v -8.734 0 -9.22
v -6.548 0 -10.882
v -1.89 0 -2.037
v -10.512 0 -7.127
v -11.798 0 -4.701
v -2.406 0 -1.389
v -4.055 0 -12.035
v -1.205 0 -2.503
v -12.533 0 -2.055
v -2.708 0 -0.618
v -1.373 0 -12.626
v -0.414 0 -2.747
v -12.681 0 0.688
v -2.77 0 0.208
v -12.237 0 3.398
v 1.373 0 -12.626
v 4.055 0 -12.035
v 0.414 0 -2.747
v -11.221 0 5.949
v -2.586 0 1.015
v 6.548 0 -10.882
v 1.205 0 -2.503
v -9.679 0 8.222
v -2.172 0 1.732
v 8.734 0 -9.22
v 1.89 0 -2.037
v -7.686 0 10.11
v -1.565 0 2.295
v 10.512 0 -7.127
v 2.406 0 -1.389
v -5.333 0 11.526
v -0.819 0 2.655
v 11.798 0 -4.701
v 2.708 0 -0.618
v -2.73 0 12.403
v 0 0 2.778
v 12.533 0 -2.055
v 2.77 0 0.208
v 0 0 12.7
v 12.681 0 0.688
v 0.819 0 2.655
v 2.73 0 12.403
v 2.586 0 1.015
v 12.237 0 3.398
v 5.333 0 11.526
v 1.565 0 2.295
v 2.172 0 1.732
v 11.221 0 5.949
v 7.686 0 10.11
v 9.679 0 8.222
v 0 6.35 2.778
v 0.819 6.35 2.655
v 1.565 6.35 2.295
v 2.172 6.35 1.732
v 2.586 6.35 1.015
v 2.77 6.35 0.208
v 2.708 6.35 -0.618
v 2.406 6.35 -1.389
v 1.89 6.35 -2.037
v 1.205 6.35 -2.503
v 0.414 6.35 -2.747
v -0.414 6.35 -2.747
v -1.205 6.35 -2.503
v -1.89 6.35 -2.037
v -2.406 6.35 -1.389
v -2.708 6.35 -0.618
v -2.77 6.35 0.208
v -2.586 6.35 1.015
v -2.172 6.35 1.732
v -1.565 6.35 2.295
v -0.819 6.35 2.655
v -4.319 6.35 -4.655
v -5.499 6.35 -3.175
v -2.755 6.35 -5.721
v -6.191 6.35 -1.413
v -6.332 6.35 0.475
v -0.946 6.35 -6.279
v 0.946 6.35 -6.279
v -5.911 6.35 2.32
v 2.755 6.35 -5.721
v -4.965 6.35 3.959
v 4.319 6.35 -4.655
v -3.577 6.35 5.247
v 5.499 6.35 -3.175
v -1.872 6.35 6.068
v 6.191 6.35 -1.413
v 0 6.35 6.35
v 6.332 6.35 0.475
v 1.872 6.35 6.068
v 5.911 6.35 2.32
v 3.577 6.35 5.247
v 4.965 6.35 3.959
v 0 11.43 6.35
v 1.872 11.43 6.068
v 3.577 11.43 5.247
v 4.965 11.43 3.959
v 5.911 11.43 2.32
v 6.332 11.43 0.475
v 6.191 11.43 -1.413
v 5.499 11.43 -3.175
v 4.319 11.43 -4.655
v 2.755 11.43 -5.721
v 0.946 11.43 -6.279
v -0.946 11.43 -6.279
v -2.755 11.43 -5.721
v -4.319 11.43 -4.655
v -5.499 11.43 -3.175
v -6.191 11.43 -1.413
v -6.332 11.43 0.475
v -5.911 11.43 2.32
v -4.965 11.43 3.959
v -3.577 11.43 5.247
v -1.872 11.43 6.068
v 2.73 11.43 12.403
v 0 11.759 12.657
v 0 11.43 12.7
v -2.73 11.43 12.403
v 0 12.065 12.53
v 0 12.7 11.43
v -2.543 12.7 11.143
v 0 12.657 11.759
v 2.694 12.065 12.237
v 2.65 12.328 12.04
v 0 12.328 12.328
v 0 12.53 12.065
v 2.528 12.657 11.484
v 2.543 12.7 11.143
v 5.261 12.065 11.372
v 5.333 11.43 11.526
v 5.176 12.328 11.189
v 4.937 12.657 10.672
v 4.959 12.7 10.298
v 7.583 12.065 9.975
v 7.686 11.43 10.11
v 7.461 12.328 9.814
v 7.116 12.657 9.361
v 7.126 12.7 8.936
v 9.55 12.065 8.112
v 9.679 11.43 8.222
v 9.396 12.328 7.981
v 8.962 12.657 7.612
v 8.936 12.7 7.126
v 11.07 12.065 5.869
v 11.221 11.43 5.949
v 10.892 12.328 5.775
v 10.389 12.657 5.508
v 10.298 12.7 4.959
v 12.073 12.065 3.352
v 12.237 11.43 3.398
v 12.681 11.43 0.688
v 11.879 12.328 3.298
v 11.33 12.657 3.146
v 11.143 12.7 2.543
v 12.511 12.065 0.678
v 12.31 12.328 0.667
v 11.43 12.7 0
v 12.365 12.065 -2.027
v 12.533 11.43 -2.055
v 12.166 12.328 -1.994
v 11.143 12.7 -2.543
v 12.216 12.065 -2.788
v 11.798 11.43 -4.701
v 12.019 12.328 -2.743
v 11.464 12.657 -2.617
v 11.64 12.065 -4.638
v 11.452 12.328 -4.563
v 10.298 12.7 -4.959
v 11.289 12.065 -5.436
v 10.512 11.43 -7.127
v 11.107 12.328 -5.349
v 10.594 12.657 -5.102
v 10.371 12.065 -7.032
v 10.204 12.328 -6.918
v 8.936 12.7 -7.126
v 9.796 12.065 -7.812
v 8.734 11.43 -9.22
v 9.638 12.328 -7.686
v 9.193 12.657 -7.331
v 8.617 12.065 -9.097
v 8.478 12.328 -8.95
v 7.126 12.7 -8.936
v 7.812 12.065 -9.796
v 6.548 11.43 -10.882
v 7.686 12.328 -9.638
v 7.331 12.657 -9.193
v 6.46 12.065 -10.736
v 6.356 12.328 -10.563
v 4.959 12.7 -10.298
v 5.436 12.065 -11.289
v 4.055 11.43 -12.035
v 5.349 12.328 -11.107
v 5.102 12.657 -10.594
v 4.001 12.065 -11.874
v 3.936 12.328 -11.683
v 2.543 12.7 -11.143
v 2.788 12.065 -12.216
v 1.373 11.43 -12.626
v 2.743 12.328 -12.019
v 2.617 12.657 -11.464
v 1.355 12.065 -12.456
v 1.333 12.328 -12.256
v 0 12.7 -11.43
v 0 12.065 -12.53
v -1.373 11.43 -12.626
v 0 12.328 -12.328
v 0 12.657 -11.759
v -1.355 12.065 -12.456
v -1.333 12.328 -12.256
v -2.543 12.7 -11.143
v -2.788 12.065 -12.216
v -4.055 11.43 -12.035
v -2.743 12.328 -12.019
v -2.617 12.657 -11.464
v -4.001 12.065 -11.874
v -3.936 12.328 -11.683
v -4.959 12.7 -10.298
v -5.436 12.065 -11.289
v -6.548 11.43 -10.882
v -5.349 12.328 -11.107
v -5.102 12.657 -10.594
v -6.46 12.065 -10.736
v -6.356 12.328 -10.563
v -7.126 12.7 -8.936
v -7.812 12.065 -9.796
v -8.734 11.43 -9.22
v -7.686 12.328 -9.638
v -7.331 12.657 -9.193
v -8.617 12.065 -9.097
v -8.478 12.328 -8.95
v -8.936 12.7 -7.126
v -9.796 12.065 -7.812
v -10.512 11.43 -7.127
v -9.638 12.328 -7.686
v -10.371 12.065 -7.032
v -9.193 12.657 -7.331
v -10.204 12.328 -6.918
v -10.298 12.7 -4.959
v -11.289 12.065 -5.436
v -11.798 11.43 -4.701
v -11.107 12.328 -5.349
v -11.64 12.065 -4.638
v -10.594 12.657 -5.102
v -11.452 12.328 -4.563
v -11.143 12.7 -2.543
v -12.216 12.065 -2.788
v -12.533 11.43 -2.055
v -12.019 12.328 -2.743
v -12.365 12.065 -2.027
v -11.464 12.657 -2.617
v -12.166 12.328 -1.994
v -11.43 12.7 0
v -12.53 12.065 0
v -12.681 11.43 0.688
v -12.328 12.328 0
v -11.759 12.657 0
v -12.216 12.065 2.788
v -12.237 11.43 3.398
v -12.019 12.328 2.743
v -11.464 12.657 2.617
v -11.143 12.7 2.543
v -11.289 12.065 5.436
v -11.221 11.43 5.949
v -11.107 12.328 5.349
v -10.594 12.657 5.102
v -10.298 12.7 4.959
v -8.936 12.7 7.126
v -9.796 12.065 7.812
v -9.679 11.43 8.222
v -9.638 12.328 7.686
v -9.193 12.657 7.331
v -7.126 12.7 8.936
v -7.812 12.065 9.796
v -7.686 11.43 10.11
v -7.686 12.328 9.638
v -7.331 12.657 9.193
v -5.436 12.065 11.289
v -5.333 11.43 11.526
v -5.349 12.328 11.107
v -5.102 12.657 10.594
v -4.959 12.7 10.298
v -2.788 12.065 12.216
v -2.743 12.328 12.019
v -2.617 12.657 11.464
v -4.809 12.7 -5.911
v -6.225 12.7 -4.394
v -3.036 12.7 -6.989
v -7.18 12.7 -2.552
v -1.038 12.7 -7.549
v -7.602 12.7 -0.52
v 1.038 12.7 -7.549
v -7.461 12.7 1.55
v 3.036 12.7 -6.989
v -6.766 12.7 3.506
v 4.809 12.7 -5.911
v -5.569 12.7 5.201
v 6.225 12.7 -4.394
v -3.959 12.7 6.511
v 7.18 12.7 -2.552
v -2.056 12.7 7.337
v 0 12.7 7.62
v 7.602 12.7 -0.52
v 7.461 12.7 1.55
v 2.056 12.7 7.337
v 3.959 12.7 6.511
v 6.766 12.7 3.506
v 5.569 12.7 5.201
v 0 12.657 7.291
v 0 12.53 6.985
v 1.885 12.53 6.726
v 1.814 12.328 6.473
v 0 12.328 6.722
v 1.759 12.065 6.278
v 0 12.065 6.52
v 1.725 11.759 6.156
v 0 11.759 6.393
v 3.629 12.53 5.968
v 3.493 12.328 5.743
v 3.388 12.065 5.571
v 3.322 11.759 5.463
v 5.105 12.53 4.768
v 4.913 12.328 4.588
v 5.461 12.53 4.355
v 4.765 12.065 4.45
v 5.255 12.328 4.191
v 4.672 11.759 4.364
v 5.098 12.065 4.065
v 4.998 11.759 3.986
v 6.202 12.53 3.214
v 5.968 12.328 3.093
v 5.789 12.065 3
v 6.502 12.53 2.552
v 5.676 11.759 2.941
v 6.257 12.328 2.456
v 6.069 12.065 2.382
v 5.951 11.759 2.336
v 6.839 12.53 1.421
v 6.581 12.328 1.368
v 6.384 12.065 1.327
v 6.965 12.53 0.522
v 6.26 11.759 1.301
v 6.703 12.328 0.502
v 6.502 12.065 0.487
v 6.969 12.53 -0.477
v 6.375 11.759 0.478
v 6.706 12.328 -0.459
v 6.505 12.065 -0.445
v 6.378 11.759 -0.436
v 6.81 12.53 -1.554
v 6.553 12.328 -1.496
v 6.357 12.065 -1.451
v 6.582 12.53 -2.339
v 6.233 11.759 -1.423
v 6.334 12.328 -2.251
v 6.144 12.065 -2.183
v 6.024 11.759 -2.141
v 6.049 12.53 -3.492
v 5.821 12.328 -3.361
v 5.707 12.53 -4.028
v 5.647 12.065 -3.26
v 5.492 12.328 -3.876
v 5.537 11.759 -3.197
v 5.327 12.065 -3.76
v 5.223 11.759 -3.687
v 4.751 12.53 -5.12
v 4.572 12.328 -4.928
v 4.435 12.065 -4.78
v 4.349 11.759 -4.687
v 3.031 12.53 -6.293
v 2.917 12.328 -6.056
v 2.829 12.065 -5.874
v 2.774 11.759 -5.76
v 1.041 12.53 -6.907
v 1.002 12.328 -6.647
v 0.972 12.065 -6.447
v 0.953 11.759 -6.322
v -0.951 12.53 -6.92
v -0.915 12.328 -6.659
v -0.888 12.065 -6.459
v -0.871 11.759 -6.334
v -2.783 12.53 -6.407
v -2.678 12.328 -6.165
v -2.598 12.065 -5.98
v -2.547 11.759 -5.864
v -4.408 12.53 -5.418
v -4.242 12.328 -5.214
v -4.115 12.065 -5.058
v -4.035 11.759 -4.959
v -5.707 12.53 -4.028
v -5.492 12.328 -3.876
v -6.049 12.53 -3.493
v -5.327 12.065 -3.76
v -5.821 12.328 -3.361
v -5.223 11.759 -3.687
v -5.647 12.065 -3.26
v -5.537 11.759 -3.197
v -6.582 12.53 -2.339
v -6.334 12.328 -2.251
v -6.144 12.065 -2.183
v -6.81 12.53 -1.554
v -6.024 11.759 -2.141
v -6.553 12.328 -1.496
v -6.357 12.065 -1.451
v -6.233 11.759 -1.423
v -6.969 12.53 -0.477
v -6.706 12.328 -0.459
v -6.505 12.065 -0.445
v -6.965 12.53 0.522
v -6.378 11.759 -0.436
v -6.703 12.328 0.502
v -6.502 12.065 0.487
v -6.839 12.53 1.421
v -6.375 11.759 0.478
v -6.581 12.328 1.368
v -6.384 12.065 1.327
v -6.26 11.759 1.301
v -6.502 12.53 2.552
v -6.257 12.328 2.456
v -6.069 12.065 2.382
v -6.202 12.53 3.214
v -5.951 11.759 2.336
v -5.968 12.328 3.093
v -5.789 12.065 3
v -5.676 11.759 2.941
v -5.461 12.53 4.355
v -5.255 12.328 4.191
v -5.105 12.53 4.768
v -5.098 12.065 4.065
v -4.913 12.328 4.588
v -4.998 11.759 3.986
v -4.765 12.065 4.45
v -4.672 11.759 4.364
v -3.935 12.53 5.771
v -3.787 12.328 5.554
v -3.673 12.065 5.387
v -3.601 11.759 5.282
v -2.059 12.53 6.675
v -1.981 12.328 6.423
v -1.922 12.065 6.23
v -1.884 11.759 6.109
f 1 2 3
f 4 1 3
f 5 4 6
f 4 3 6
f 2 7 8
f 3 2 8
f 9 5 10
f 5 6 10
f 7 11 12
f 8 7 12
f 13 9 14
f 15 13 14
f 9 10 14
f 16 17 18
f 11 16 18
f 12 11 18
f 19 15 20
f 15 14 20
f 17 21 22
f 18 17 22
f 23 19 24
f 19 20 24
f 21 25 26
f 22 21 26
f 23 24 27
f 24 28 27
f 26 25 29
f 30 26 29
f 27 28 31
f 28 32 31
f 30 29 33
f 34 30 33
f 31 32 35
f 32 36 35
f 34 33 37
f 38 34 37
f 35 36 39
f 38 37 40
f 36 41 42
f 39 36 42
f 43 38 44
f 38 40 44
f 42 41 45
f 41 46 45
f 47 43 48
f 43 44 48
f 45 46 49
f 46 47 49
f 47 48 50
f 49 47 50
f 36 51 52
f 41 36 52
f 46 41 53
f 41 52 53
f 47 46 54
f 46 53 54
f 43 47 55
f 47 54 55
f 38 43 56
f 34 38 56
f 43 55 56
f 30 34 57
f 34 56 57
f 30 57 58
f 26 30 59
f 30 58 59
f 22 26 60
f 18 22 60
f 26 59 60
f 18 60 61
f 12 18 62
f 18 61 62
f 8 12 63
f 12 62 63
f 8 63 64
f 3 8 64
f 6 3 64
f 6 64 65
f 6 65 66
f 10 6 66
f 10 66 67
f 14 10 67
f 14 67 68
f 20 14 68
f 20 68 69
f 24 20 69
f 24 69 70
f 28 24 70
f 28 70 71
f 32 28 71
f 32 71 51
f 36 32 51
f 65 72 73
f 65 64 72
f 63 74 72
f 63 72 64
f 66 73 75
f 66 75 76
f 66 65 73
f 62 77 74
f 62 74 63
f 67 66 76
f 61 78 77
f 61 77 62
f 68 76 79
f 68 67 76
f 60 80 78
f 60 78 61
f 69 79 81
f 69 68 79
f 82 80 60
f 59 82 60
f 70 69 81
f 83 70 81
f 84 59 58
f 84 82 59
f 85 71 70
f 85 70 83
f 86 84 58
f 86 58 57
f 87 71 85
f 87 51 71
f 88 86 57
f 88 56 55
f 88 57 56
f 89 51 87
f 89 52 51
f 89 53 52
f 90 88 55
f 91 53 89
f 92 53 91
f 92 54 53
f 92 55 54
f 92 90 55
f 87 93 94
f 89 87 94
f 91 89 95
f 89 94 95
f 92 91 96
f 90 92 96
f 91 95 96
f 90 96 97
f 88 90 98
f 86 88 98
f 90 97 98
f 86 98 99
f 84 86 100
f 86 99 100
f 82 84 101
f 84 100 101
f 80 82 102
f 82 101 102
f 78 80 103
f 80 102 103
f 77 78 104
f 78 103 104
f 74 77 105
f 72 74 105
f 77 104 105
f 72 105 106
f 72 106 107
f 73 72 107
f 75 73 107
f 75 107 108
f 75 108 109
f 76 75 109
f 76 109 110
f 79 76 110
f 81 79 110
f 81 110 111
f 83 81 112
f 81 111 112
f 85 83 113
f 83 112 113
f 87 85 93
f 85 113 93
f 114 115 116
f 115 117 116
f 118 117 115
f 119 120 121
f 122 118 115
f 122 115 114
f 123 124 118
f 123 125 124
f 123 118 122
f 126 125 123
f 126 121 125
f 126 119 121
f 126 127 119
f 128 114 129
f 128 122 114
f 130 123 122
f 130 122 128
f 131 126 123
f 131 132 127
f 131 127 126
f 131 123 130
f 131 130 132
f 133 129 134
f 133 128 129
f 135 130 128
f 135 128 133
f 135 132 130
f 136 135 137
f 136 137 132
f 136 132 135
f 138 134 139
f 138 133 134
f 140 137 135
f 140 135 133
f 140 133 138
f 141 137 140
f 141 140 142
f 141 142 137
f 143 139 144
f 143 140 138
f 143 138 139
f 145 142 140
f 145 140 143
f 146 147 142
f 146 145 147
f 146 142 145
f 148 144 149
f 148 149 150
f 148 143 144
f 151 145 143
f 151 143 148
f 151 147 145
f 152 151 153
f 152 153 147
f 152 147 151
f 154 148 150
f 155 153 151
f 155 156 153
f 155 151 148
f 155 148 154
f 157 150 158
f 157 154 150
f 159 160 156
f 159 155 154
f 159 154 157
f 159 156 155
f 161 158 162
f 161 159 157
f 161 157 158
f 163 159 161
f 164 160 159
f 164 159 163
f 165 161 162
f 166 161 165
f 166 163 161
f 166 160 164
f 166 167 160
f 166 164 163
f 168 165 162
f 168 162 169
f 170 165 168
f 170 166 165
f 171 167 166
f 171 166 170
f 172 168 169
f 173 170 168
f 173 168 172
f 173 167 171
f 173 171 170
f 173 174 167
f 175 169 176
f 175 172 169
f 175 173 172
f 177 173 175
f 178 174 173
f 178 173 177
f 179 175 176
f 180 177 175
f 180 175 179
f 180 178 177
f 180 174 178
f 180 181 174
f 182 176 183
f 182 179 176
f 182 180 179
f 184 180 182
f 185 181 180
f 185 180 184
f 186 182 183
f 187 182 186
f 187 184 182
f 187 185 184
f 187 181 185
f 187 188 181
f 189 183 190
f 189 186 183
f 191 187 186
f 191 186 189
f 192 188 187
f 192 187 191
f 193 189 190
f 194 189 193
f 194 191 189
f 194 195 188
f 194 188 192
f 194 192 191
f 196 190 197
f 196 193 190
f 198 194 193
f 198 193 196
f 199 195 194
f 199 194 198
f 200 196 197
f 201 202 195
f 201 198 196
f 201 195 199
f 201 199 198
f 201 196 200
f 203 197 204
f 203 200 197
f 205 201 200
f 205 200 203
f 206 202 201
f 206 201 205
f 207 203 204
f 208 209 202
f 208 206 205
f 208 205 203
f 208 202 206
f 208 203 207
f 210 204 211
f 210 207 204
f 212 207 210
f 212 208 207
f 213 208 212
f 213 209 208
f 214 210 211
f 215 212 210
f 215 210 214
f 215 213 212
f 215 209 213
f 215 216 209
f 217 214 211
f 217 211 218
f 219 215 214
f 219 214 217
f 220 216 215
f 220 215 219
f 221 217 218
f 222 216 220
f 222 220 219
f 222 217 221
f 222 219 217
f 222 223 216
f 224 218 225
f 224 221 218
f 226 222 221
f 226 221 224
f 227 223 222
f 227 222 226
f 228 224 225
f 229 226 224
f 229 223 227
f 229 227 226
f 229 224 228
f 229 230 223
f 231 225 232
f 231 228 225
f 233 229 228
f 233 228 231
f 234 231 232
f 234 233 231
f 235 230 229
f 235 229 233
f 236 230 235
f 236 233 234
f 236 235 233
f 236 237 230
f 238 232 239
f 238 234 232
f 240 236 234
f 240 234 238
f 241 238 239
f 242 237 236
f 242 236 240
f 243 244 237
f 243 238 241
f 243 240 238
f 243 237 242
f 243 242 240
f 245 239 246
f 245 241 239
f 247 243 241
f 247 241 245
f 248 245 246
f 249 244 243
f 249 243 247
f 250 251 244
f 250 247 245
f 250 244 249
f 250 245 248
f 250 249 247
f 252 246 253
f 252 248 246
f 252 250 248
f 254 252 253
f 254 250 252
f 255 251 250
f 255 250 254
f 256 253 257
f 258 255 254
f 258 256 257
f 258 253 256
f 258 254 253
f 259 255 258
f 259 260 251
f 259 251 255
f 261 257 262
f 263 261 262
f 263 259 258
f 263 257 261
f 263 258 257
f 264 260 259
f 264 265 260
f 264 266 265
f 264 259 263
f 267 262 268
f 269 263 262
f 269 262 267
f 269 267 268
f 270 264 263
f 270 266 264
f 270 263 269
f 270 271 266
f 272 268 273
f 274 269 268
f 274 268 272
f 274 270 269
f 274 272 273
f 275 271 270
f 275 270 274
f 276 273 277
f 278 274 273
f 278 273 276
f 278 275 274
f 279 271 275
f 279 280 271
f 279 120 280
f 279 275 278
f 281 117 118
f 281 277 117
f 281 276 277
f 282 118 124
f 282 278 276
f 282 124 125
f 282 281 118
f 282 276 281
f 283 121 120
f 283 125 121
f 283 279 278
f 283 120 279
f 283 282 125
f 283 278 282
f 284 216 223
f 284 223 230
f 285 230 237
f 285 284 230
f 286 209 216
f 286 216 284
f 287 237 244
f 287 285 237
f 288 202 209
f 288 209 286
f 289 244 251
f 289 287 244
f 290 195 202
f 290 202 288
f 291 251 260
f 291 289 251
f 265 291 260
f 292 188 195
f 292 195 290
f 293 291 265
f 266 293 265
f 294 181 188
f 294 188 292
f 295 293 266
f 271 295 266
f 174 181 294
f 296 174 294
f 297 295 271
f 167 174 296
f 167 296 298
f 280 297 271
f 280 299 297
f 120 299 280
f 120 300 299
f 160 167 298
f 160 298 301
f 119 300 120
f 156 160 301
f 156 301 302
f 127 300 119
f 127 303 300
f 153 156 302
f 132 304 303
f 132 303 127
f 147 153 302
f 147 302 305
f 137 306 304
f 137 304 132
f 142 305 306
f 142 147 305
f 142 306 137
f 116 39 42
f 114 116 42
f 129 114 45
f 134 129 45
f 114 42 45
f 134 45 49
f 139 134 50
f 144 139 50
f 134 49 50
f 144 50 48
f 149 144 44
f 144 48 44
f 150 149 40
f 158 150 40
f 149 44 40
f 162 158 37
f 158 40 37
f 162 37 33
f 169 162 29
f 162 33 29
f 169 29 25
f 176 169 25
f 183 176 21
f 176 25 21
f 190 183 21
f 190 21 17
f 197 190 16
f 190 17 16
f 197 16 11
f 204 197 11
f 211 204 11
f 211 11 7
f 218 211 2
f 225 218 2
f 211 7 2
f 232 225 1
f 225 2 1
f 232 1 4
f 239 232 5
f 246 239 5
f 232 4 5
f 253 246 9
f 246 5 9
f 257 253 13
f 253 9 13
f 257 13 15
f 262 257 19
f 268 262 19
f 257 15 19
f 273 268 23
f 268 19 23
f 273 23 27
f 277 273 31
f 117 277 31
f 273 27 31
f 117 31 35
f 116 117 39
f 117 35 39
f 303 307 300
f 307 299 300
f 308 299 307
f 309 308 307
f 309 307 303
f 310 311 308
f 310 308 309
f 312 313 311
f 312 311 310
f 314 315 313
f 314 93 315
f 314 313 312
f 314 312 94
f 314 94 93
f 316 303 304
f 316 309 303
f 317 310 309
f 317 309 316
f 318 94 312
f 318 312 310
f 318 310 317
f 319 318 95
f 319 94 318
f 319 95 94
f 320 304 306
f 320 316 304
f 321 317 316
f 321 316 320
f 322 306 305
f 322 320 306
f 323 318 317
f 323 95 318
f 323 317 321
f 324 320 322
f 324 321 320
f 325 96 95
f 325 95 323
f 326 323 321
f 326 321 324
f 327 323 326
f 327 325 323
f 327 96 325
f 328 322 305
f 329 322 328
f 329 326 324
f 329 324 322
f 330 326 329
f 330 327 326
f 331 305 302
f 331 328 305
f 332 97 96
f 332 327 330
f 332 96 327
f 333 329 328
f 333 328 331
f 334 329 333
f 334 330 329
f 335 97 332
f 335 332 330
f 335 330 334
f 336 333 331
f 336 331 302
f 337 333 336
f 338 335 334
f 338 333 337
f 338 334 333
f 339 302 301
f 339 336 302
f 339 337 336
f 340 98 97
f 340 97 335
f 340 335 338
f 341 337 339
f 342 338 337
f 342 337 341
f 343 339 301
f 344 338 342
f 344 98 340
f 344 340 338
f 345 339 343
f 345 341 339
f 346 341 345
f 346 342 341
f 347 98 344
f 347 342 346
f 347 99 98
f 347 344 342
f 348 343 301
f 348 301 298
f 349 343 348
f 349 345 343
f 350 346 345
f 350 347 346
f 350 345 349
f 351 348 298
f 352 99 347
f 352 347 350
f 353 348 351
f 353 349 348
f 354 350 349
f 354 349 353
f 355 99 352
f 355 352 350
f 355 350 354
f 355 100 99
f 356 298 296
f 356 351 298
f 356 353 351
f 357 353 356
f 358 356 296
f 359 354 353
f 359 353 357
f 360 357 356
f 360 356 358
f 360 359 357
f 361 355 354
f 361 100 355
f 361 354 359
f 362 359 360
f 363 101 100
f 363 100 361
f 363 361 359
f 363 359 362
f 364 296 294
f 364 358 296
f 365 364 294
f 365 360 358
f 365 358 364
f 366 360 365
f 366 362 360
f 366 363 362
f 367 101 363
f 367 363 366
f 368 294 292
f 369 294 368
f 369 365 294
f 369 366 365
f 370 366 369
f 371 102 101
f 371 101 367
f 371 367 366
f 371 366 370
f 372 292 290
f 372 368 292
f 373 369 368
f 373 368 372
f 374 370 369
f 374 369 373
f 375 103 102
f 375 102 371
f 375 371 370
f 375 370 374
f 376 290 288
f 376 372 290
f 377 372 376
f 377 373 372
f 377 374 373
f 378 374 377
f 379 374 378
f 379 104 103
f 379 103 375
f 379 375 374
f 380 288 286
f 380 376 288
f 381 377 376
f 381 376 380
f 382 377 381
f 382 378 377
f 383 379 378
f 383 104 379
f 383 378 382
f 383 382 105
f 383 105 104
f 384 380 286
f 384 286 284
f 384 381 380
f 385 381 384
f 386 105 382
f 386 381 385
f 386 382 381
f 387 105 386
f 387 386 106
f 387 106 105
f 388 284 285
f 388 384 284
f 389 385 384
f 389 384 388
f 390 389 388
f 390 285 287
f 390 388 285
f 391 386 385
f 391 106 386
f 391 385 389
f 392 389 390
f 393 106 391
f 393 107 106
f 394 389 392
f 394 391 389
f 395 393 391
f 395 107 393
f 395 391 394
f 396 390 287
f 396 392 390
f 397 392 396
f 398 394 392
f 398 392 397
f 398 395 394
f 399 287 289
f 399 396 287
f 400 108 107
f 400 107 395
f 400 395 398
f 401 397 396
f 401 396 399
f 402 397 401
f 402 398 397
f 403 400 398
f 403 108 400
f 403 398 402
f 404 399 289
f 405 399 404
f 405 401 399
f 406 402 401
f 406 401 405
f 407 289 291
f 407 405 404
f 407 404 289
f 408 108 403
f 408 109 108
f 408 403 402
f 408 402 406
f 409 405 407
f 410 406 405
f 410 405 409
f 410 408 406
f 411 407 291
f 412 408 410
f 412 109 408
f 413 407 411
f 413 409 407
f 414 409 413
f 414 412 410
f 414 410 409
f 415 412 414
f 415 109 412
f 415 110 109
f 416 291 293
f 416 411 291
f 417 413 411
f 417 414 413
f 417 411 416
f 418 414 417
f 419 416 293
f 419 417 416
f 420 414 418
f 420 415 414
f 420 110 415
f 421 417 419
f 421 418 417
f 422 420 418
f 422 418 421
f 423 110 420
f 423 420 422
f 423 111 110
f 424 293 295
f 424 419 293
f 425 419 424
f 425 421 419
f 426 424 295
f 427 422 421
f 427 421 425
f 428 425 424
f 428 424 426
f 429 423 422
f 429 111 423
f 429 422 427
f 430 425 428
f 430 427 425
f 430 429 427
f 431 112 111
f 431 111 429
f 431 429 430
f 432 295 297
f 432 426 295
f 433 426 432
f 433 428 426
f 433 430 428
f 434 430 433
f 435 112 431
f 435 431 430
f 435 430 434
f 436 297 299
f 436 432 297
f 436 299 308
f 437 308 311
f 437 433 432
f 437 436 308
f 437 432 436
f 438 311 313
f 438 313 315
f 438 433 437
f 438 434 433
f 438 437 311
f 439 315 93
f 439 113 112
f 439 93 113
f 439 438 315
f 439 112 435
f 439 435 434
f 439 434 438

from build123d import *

# Parameters (mm, degrees)
SKETCH1_R           = 12.7
BOSS_EXTRUDE1_DEPTH = 12.7
SKETCH2_R           = 6.35
CUT_EXTRUDE1_DEPTH  = 6.35
SKETCH3_R           = 2.778125
CUT_EXTRUDE2_DEPTH  = 20.05
FILLET1_R           = 1.27


with BuildPart() as part:
    # Sketch1 → Boss-Extrude1 (new body)
    with BuildSketch(Plane(origin=(0, 0, 0), x_dir=(1, 0, 0), z_dir=(0, 1, 0))):
        with Locations(Location((0, 0, 0), (0, 0, 270))):
            Circle(SKETCH1_R)
    extrude(amount=BOSS_EXTRUDE1_DEPTH)

    # Sketch2 → Cut-Extrude1 (cut)
    with BuildSketch(Plane(origin=(0, 12.7, 0), x_dir=(1, 0, 0), z_dir=(0, 1, 0))):
        with Locations(Location((0, 0, 0), (0, 0, 270))):
            Circle(SKETCH2_R)
    extrude(amount=-CUT_EXTRUDE1_DEPTH, mode=Mode.SUBTRACT)

    # Sketch3 → Cut-Extrude2 (cut, through all)
    with BuildSketch(Plane(origin=(0, 6.35, 0), x_dir=(1, 0, 0), z_dir=(0, 1, 0))):
        with Locations(Location((0, 0, 0), (0, 0, 270))):
            Circle(SKETCH3_R)
    extrude(amount=-CUT_EXTRUDE2_DEPTH, mode=Mode.SUBTRACT)

    # Fillet1
    fillet1_edges = [part.edges().sort_by_distance(p)[0] for p in [
        (0, 12.7, -12.7),
        (0, 12.7, -6.35),
    ]]
    fillet(fillet1_edges, radius=FILLET1_R)


solid = part.part
